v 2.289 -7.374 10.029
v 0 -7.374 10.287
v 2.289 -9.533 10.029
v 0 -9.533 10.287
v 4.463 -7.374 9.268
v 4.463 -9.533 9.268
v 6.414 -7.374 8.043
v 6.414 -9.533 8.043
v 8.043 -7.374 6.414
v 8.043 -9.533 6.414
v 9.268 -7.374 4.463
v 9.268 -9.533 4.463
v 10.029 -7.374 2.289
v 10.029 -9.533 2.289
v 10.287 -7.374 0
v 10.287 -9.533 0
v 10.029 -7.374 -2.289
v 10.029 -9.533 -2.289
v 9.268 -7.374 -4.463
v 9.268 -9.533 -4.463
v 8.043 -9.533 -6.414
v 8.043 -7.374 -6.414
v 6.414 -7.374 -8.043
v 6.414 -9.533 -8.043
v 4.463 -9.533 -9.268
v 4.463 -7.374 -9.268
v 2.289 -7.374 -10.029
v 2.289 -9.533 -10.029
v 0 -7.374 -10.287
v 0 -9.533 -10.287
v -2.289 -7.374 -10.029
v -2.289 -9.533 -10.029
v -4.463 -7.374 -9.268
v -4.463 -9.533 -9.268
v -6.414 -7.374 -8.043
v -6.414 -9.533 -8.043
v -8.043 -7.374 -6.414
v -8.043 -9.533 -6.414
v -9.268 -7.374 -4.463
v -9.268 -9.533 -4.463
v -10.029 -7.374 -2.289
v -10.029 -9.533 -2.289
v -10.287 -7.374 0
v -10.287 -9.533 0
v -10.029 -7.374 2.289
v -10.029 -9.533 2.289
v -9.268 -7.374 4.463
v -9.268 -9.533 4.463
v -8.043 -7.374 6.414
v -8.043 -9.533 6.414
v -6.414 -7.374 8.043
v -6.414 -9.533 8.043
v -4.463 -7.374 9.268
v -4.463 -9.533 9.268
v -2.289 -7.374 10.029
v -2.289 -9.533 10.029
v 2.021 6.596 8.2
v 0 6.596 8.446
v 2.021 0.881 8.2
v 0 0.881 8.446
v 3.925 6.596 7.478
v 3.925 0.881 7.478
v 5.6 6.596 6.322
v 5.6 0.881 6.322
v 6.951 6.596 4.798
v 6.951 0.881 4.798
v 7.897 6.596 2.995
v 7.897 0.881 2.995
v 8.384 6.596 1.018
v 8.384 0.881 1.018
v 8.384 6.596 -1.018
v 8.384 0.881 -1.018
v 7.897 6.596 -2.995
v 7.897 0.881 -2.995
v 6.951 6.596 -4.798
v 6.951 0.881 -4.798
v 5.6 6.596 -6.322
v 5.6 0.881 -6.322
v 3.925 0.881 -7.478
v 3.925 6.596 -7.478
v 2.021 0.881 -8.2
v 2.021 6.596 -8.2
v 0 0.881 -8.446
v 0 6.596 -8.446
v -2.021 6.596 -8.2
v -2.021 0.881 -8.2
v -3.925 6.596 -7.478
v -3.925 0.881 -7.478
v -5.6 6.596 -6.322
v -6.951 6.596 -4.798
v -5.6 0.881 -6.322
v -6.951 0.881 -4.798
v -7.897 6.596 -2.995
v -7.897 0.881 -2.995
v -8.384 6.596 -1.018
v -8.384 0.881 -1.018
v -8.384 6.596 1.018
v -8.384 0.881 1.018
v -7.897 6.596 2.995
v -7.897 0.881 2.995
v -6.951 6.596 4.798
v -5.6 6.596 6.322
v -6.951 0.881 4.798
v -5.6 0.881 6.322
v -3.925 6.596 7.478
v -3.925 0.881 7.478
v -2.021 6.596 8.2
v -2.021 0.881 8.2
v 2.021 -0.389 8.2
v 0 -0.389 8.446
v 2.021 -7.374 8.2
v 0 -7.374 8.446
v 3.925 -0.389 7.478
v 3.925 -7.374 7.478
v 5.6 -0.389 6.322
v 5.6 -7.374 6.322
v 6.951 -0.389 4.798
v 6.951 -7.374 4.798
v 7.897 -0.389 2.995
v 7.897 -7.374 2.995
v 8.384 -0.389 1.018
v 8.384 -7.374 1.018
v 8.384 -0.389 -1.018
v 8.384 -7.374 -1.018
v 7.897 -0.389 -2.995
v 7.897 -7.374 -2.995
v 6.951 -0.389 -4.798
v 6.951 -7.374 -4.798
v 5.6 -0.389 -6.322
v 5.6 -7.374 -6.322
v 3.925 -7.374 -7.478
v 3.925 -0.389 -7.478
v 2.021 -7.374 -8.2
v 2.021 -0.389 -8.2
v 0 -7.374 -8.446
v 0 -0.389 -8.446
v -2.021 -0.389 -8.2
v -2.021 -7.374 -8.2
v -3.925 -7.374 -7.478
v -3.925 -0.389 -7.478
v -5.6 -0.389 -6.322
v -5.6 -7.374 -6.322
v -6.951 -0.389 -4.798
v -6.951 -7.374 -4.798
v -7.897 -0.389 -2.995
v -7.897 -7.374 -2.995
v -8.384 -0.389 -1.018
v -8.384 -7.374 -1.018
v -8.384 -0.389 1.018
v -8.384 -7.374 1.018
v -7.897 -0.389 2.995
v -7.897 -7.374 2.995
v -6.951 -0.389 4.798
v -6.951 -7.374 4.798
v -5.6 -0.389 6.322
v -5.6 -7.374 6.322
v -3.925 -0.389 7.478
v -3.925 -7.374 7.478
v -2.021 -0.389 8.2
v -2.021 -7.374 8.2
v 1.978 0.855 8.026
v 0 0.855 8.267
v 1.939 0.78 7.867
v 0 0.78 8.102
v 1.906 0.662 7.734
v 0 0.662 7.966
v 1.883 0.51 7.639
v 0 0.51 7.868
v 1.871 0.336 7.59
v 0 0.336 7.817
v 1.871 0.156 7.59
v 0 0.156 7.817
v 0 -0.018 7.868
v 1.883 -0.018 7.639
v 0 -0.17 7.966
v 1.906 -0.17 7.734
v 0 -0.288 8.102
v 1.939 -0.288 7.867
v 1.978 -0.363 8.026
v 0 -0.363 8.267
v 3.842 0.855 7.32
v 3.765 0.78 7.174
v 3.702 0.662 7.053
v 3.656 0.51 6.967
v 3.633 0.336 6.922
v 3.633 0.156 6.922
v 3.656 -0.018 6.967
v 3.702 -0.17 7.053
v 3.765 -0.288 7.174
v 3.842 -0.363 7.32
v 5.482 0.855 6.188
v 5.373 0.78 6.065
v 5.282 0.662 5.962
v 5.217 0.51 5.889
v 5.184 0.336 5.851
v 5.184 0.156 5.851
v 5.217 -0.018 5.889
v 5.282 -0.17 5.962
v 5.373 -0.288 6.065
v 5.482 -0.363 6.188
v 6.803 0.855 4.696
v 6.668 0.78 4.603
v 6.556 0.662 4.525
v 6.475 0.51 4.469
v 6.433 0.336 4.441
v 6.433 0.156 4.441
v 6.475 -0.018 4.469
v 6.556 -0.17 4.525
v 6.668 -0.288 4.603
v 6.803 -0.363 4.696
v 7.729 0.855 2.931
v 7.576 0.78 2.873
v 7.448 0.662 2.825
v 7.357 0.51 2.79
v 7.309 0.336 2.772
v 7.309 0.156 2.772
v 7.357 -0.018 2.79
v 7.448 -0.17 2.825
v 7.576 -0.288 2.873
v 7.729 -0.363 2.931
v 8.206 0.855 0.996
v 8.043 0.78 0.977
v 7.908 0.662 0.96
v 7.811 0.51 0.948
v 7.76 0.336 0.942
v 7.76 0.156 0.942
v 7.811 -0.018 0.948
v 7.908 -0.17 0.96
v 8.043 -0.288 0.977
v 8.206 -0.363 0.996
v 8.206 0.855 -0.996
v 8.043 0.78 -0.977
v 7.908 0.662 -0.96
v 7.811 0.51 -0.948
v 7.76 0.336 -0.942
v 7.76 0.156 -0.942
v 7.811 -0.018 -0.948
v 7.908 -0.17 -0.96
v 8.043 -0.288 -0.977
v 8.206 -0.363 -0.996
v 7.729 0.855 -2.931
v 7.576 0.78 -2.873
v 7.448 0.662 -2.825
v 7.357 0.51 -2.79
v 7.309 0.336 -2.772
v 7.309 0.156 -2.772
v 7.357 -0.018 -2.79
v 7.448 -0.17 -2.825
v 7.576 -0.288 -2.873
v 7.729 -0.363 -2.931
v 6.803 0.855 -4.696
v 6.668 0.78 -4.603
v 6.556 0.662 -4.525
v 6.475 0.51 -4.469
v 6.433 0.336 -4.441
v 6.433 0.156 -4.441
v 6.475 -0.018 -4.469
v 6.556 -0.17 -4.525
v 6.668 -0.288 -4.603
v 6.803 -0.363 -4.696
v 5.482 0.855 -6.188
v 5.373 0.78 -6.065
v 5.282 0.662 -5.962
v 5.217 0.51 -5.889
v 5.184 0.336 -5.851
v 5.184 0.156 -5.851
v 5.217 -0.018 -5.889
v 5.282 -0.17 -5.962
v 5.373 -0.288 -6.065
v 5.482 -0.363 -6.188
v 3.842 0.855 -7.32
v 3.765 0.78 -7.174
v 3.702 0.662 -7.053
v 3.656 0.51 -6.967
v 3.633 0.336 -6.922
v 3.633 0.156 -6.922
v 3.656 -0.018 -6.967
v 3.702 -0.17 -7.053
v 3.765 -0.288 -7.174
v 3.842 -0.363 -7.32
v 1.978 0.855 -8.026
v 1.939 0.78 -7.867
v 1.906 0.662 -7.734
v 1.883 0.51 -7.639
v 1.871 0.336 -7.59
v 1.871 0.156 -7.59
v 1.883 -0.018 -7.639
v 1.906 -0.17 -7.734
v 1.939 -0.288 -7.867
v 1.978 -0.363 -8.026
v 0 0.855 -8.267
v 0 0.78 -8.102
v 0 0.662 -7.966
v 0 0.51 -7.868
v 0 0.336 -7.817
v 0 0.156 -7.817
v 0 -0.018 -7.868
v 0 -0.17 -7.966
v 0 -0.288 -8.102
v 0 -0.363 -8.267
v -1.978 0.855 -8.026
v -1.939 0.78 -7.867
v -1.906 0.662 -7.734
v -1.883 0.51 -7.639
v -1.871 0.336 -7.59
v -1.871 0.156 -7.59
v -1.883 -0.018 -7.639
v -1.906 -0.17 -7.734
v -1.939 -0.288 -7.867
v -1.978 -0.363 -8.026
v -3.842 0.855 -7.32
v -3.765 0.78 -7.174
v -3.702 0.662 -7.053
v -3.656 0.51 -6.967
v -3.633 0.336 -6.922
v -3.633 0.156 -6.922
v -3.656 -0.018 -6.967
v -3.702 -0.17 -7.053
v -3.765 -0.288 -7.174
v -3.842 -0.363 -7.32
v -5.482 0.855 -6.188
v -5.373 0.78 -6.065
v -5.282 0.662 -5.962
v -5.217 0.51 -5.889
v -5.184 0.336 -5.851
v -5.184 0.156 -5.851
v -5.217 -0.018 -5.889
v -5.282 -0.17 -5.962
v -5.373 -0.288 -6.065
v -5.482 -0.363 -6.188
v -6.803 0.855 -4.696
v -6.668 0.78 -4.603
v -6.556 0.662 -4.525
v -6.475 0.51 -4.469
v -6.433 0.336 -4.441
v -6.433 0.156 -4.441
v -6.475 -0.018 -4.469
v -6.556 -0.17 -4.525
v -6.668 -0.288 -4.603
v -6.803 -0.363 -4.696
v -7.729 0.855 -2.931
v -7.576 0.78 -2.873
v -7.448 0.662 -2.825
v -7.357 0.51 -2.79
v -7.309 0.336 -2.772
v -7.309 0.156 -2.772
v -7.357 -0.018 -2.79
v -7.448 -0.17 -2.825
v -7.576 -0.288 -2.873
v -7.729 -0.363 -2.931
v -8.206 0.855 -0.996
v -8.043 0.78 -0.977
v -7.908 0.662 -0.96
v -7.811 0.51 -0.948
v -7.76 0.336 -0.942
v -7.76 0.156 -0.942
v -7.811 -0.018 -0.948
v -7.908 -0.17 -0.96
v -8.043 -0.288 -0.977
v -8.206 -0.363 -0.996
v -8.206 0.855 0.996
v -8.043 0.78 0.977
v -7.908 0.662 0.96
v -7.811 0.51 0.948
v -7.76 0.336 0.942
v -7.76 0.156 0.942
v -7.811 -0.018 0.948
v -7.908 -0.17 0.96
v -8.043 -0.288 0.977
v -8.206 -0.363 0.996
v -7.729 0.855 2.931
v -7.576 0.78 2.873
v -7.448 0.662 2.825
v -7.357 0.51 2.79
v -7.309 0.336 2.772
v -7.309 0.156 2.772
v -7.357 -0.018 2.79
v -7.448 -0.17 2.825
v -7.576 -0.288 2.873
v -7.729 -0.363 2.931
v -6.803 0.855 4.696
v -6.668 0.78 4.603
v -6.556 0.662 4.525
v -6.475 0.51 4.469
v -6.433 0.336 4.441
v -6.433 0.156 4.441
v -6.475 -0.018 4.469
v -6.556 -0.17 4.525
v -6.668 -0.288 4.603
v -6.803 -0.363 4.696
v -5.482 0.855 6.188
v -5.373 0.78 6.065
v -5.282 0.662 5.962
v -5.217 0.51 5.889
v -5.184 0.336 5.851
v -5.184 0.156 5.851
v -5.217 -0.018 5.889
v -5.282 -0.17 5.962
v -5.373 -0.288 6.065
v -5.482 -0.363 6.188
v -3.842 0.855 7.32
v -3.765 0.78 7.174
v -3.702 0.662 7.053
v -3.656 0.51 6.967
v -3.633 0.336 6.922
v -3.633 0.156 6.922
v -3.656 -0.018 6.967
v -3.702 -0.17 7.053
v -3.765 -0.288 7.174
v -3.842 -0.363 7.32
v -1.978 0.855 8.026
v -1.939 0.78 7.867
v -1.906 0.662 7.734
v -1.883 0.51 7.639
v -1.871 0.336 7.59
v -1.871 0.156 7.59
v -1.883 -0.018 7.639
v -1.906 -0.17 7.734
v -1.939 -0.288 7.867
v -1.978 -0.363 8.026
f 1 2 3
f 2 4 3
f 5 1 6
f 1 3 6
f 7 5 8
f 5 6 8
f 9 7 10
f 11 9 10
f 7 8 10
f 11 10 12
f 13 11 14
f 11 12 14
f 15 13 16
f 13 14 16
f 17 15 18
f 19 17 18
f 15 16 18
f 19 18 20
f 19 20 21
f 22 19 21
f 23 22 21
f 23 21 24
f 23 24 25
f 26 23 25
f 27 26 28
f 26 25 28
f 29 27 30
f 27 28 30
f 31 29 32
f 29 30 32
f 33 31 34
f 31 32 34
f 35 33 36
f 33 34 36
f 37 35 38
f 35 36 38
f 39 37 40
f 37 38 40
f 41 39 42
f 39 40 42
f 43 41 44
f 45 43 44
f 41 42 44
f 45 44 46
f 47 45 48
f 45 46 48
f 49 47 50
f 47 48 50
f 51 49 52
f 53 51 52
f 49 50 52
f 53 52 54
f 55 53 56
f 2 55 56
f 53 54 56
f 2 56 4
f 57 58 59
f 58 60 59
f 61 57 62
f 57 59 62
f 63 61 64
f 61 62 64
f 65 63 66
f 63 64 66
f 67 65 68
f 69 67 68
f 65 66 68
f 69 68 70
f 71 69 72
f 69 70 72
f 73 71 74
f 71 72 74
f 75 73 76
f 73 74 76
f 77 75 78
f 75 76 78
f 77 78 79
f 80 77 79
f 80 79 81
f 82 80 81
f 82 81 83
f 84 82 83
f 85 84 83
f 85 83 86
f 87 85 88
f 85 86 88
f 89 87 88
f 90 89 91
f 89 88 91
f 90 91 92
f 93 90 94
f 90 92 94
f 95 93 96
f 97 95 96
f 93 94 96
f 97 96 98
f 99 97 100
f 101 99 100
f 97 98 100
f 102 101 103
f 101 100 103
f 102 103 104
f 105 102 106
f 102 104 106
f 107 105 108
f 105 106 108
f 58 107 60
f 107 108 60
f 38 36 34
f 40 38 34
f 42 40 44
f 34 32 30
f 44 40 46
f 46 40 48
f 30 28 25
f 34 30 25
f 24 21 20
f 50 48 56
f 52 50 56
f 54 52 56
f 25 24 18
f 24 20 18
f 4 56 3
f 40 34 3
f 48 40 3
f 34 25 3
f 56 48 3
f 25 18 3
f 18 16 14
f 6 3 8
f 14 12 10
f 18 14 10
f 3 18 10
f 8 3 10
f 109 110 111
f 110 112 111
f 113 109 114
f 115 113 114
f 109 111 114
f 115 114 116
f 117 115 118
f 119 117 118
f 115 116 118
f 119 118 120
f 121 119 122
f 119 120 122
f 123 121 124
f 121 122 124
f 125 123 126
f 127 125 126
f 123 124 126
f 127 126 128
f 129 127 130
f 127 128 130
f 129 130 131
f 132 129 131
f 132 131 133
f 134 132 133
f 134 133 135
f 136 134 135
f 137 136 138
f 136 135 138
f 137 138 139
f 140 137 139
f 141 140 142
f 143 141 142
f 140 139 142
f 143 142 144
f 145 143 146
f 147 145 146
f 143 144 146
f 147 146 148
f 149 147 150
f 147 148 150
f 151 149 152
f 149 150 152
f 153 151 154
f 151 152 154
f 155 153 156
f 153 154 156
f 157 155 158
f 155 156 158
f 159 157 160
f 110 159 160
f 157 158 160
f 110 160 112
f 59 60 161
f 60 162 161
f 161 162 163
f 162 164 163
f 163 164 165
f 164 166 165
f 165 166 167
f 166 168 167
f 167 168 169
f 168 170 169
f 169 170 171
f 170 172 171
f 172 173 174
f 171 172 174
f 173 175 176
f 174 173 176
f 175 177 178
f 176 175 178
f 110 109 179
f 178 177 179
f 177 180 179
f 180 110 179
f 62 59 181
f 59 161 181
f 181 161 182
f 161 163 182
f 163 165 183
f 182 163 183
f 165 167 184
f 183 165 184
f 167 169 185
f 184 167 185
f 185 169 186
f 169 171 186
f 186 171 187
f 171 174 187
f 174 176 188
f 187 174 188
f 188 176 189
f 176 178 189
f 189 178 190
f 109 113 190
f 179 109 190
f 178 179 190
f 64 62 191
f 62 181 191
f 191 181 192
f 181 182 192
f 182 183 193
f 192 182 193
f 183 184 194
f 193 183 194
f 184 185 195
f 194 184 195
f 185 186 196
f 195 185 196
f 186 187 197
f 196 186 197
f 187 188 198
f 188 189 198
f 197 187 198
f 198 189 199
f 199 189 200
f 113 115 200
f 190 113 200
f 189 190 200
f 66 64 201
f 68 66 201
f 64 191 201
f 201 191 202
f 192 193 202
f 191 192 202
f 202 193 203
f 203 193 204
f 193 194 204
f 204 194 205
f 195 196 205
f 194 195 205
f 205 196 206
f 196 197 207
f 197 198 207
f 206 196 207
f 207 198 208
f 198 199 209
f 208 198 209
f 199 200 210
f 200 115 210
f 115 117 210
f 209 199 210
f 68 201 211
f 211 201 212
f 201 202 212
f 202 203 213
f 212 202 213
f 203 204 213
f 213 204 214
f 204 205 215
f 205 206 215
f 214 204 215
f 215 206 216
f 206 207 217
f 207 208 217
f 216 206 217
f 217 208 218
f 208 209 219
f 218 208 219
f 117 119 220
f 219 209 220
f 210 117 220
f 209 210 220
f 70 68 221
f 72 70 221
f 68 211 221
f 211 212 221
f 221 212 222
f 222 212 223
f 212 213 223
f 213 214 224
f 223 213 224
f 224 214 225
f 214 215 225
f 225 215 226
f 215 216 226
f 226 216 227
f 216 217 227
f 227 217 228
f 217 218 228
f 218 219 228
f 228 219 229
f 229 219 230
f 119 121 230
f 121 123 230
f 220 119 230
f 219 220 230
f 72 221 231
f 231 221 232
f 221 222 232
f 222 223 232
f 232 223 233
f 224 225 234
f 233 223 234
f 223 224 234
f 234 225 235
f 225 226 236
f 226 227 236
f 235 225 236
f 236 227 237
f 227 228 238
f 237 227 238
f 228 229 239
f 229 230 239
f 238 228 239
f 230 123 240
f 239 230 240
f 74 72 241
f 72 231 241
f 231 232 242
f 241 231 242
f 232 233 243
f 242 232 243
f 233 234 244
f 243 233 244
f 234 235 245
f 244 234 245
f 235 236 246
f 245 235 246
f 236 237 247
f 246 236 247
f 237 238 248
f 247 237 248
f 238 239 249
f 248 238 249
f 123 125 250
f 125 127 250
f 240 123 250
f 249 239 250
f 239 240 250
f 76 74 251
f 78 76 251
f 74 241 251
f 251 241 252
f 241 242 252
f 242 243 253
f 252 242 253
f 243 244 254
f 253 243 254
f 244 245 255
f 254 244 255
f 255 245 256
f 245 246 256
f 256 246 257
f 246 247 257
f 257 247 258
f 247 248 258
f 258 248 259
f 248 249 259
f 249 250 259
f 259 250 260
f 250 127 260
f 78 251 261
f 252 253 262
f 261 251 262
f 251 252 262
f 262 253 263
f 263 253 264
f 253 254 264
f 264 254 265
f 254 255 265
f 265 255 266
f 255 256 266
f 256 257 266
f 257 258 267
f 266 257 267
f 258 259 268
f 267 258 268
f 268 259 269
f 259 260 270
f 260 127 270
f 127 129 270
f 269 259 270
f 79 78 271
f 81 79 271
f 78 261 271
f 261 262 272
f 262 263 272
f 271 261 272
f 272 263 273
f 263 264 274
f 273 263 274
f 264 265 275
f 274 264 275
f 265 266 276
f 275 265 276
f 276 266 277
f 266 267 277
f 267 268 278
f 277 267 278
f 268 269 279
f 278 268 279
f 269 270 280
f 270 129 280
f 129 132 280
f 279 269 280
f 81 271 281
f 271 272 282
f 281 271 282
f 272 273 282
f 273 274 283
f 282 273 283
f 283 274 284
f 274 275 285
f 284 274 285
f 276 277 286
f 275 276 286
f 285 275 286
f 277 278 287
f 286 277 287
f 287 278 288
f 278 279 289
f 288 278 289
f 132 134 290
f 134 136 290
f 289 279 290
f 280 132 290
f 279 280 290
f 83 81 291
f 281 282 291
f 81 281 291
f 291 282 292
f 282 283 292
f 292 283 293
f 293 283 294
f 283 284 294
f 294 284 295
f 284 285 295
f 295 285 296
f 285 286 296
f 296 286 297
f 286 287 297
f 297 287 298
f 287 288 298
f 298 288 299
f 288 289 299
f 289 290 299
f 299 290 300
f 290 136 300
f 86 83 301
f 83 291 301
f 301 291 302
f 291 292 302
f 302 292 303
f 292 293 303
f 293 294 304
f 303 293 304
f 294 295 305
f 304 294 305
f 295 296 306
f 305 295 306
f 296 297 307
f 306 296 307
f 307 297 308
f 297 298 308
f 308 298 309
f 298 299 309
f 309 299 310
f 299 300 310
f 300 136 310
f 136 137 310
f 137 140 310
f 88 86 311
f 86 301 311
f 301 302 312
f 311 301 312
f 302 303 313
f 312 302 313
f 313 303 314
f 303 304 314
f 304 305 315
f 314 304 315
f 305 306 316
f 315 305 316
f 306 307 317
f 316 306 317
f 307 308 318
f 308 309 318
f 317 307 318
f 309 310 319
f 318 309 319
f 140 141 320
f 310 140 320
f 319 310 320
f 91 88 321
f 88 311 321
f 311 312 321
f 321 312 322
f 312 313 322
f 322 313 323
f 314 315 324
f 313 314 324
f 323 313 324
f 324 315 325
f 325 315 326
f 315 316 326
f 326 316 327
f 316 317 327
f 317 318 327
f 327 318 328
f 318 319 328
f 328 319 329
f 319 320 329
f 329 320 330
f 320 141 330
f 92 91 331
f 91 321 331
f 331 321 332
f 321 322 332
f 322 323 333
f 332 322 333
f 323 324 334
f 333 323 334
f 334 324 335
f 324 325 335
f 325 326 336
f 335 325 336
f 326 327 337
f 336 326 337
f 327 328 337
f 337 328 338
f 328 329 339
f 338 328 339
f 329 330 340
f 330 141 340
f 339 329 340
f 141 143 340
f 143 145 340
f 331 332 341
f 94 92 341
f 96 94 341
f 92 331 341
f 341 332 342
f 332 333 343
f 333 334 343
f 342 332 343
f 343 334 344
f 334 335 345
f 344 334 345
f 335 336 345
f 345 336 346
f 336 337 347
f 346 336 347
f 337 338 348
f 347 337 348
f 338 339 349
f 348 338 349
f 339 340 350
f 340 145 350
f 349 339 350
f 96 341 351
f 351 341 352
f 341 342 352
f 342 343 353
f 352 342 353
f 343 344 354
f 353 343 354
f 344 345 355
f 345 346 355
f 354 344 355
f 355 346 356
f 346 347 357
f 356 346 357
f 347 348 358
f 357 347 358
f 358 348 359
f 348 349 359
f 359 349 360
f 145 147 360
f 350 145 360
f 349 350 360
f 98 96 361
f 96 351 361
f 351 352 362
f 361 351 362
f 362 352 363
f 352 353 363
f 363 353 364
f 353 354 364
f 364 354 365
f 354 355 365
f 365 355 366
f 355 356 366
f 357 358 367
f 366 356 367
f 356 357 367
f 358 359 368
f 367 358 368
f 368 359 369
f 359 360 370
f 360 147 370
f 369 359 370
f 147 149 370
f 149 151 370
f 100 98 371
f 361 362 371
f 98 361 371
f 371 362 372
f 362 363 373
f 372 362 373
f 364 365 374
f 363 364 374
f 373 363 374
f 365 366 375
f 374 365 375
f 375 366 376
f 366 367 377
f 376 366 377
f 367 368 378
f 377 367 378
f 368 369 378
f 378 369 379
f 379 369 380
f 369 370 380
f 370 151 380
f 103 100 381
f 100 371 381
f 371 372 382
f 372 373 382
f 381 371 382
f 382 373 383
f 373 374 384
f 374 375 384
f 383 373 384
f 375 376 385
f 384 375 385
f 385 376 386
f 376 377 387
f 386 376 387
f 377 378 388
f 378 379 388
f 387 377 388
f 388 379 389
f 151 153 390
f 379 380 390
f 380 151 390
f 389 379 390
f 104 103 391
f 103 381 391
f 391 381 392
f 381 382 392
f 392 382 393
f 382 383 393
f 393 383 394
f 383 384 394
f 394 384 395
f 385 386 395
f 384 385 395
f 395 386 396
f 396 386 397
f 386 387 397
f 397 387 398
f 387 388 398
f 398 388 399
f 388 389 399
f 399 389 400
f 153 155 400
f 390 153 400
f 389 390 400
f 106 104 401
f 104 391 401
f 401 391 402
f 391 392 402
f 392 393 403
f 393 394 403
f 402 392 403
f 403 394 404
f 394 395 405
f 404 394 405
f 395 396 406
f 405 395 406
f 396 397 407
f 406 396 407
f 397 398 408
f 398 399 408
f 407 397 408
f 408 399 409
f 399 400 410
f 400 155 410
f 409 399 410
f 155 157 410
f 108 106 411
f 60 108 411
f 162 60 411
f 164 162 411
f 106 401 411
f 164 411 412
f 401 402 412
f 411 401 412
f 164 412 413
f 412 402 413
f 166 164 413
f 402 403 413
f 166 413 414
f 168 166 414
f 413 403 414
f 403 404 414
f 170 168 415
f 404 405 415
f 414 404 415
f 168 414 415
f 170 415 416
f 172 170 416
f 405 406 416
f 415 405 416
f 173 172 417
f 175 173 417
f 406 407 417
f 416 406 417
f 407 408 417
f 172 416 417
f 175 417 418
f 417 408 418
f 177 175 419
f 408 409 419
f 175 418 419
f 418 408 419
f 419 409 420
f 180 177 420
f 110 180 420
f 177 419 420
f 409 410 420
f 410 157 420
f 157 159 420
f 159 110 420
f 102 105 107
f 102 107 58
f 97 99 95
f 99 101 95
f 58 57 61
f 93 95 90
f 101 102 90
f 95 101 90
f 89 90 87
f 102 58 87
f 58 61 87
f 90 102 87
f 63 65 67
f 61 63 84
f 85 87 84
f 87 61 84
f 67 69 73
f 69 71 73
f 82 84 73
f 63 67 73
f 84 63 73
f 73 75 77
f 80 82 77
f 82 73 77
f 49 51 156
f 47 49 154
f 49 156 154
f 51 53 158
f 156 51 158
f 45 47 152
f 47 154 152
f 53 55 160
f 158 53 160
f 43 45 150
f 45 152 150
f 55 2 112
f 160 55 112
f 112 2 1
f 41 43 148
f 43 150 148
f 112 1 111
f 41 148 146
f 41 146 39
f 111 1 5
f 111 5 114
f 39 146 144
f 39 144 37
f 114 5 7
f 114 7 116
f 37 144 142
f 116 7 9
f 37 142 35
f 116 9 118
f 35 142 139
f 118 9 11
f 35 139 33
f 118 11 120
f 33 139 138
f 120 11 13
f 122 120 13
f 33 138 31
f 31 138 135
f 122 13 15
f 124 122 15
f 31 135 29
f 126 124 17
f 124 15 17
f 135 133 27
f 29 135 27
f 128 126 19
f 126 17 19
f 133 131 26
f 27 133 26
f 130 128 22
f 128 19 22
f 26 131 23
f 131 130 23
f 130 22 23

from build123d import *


with BuildPart() as f1:
    # F0 (on Right) → F1 (revolve)
    with BuildSketch(Plane.YZ):
        with BuildLine():
            Line((-9.532932, 10.287), (-9.532932, 0))
            Line((-9.532932, 0), (-7.373932, 0))
            Line((-7.373932, 0), (6.596068, 0))
            Line((6.596068, 0), (6.596068, 8.4455))
            Line((6.596068, 8.4455), (3.657317, 8.4455))
            Line((3.657317, 8.4455), (0.881068, 8.4455))
            ThreePointArc((0.881068, 8.4455), (0.246068, 7.8105), (-0.388932, 8.4455))
            Line((-0.388932, 8.4455), (-3.165181, 8.4455))
            Line((-3.165181, 8.4455), (-7.373932, 8.4455))
            Line((-7.373932, 8.4455), (-7.373932, 10.287))
            Line((-7.373932, 10.287), (-9.532932, 10.287))
        make_face()
    revolve(axis=Axis((0, -0.388932, 0), (0, 1, 0)))


solid = f1.part
